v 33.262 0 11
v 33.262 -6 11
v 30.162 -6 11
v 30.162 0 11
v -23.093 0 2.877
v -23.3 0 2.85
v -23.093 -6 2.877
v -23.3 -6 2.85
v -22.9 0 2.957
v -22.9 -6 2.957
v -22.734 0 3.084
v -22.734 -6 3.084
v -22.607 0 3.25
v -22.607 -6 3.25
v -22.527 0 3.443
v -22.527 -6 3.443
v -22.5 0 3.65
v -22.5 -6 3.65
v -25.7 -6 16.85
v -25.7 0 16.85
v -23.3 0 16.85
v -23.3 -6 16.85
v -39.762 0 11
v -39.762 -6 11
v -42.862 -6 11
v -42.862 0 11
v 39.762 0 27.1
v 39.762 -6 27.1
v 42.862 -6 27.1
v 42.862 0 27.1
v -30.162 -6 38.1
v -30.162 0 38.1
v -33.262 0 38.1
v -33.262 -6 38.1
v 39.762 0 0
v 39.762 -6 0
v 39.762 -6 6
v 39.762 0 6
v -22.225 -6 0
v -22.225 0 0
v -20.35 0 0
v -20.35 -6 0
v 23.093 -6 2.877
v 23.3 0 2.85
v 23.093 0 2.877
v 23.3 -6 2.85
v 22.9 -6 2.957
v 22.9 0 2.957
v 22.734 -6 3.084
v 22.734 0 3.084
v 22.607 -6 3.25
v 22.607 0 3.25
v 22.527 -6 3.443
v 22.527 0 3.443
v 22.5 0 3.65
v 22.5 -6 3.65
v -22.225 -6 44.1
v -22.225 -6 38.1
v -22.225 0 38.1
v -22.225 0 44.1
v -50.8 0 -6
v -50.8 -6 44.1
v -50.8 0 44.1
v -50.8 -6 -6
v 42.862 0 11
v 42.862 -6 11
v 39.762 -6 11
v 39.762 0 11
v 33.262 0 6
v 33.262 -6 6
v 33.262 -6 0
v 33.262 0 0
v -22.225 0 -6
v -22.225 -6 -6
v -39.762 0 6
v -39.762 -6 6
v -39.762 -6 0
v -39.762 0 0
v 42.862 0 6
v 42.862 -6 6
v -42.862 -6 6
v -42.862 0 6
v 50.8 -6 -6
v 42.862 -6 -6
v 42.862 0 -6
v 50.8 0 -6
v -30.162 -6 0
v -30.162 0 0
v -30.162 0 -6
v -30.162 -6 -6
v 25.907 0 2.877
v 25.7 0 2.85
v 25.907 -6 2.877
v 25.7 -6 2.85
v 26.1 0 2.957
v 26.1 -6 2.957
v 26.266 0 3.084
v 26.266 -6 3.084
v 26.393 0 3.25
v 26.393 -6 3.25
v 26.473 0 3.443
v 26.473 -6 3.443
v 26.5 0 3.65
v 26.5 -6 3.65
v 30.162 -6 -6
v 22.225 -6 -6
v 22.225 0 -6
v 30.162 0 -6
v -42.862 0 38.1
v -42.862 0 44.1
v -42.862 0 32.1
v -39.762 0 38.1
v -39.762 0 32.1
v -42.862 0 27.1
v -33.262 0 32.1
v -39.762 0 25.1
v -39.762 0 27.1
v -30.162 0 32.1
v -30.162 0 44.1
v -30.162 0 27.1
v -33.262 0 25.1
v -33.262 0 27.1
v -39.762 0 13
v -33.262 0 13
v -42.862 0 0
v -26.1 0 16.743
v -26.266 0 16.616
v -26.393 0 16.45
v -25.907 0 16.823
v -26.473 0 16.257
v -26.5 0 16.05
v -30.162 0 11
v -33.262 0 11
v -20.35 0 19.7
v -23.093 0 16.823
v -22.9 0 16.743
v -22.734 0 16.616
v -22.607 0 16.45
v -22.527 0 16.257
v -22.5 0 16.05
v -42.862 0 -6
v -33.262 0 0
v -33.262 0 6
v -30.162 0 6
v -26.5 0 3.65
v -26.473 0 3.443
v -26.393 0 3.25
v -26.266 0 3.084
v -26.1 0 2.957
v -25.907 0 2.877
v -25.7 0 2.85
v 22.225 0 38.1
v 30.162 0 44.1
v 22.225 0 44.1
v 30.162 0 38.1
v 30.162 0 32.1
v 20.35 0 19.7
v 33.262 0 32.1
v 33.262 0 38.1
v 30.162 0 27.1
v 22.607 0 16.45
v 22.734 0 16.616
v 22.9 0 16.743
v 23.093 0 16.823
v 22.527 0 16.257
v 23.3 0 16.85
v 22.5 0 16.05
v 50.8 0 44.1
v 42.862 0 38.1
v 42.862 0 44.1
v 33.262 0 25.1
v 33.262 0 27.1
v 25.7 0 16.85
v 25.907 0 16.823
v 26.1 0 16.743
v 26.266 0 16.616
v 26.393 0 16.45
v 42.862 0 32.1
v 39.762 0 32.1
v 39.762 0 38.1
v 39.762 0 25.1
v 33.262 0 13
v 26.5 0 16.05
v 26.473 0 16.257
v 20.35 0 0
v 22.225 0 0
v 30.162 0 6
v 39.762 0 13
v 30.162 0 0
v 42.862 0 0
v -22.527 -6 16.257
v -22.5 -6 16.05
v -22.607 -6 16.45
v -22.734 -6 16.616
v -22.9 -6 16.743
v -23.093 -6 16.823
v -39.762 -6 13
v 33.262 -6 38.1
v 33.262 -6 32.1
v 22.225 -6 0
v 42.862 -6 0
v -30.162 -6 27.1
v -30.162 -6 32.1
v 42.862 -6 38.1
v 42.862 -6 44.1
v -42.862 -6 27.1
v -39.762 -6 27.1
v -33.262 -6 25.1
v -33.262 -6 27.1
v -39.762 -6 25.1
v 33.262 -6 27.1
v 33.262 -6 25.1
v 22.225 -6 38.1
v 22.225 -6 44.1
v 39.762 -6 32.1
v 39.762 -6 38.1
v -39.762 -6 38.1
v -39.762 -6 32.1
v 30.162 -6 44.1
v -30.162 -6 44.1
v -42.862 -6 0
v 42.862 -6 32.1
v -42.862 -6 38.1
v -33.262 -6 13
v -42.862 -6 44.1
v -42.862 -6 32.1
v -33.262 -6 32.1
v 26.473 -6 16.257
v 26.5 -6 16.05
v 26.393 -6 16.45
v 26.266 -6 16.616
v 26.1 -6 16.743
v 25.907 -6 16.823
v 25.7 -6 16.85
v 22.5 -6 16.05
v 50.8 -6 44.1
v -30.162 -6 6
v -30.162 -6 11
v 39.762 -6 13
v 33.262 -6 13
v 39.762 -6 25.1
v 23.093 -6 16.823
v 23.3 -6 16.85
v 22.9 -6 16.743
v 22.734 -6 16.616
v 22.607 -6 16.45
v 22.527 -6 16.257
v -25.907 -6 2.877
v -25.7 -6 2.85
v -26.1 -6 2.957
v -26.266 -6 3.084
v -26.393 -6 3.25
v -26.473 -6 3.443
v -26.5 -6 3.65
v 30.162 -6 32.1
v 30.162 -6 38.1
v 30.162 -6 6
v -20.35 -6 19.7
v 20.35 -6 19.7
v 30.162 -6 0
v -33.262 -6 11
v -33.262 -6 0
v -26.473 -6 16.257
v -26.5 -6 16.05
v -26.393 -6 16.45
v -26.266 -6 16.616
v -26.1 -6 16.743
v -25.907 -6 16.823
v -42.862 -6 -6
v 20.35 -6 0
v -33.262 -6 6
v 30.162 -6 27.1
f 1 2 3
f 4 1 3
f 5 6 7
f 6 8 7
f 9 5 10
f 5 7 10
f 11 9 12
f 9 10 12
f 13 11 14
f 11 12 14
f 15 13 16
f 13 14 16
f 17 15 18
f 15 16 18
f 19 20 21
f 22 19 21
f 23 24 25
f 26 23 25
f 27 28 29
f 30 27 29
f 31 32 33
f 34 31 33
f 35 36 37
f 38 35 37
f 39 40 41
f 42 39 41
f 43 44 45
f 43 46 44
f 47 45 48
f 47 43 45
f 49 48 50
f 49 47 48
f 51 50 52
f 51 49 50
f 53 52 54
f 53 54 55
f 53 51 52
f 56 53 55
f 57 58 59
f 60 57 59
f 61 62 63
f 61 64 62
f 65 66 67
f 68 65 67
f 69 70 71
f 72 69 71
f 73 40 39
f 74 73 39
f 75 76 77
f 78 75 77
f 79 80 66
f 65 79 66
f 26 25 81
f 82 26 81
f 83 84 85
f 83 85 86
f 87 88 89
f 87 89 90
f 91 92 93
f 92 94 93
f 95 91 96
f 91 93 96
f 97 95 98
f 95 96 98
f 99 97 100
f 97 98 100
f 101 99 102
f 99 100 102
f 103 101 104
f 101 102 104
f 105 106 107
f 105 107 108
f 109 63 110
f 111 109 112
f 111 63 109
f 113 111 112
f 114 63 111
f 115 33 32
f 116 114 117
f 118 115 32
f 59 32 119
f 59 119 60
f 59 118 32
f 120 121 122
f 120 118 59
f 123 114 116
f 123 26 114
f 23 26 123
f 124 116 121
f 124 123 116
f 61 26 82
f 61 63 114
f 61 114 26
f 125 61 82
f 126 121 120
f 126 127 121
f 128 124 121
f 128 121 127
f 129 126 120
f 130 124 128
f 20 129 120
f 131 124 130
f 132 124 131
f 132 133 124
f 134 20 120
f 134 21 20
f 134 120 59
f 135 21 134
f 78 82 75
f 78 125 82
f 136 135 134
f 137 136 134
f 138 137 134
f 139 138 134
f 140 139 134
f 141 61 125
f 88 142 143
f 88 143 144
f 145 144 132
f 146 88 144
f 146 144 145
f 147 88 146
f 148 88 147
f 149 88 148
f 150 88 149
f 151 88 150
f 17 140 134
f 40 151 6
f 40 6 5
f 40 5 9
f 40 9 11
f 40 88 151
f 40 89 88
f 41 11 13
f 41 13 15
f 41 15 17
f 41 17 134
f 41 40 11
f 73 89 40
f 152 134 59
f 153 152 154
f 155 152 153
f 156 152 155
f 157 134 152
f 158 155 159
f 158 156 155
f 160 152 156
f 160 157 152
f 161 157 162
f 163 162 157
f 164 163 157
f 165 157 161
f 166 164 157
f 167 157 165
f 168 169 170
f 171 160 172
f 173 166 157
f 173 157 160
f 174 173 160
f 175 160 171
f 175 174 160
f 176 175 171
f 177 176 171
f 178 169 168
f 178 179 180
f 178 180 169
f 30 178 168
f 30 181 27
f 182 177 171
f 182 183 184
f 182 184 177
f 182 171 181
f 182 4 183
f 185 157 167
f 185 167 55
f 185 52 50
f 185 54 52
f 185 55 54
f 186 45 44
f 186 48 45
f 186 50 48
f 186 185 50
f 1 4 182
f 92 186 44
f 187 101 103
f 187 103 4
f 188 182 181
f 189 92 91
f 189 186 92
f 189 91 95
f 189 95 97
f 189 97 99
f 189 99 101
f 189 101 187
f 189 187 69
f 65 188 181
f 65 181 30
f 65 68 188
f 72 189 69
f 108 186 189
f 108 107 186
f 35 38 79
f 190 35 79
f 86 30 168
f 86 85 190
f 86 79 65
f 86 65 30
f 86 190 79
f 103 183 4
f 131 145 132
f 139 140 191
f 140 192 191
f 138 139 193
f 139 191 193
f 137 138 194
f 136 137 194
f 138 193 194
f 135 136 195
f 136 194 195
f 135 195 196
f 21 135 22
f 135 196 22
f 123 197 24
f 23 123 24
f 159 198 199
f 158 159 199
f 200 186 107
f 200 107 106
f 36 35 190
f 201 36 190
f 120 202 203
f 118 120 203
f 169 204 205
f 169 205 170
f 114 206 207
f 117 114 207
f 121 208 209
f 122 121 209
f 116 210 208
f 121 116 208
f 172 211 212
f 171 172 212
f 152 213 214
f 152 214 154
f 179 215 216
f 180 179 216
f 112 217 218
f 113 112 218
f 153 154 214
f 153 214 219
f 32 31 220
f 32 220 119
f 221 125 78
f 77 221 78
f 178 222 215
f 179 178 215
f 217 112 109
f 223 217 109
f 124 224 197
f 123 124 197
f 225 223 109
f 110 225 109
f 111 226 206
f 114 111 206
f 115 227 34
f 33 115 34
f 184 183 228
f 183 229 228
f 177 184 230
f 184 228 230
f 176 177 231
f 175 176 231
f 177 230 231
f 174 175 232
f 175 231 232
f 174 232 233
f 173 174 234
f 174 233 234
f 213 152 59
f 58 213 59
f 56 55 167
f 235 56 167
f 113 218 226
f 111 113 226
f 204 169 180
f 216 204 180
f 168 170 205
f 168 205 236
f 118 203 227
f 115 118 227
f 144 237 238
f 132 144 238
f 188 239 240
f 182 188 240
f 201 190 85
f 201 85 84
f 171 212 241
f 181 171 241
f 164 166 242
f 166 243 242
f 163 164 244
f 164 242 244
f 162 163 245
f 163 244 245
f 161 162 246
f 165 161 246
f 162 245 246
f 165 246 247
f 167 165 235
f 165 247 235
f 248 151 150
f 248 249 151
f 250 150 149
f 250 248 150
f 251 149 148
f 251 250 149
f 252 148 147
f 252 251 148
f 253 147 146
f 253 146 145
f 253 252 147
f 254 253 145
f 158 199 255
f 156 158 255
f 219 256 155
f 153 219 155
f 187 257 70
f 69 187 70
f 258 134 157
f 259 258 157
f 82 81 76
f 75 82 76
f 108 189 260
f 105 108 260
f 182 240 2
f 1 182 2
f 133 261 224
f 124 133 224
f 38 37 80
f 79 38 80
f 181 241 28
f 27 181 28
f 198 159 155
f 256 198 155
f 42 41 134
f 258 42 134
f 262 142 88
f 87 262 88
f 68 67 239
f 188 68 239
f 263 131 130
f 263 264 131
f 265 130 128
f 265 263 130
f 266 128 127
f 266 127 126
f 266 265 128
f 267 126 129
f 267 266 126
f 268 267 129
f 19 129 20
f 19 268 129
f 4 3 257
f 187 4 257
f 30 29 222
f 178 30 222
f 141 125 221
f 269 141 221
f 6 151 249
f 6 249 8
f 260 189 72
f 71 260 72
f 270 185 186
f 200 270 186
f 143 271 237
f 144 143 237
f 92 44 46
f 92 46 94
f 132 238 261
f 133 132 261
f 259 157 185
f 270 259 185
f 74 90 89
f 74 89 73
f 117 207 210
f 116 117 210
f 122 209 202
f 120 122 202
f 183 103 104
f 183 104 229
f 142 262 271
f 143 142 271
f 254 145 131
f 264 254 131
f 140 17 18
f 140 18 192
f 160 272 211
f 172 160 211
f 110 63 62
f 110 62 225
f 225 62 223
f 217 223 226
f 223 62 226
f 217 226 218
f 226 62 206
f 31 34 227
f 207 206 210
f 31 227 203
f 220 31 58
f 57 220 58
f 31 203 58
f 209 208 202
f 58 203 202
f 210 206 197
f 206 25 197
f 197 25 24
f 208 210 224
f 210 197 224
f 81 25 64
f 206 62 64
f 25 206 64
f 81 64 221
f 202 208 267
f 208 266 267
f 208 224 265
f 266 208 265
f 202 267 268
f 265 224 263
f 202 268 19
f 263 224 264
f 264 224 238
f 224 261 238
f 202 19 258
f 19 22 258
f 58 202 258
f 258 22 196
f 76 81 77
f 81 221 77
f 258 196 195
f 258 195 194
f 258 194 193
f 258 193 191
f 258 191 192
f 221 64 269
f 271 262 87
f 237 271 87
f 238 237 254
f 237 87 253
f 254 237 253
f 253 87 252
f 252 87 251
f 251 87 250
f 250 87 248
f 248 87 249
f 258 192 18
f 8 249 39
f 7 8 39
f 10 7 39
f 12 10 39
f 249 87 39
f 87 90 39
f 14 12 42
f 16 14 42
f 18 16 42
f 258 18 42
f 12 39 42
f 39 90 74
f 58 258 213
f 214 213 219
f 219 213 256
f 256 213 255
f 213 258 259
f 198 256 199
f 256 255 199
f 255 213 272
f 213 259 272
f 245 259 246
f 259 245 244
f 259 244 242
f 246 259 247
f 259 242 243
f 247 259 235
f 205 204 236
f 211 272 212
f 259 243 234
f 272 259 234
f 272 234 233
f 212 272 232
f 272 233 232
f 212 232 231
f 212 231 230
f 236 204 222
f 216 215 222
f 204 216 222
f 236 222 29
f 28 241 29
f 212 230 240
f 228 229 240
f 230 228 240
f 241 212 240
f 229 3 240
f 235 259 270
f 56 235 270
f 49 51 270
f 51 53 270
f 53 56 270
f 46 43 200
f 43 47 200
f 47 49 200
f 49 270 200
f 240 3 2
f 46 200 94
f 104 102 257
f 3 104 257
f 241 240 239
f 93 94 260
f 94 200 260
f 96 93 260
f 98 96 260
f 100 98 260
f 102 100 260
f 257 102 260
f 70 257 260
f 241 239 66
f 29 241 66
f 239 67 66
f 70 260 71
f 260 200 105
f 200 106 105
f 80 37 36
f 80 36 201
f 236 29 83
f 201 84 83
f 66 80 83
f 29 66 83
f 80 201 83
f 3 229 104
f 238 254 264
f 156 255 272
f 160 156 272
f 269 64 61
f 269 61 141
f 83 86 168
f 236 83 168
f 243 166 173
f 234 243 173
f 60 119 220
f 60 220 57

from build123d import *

# Parameters (mm, degrees)
F0_W     = 4
F0_H     = 14
F1_DEPTH = 6
F2_R     = 0.8
F3_W     = 7.9375
F3_H     = 6
F4_DEPTH = 6
F5_W     = 7.9375
F5_H     = 6
F6_DEPTH = 6
F8_DEPTH = 25.4


with BuildPart() as f1:
    # F0 (on Front) → F1 (new body)
    with BuildSketch(Plane.XZ):
        Polygon((50.8, 38.1), (-50.8, 38.1), (-50.8, 0), (-20.35, 0), (-20.35, 19.7), (20.35, 19.7), (20.35, 0), (50.8, 0), align=None)
        with Locations((-24.5, 9.85)):
            Rectangle(F0_W, F0_H, mode=Mode.SUBTRACT)
        with Locations((24.5, 9.85)):
            Rectangle(F0_W, F0_H, mode=Mode.SUBTRACT)
    extrude(amount=F1_DEPTH)

    # F2
    f2_edges = [f1.edges().sort_by_distance(p)[0] for p in [
        (-26.5, -3, 16.85),
        (-22.5, -3, 2.85),
        (-22.5, -3, 16.85),
        (-26.5, -3, 2.85),
        (22.5, -3, 2.85),
        (22.5, -3, 16.85),
        (26.5, -3, 16.85),
        (26.5, -3, 2.85),
    ]]
    fillet(f2_edges, radius=F2_R)

    # F3 (on face) → F4 (join)
    with BuildSketch(Plane(origin=(0, 0, 0), x_dir=(1, 0, 0), z_dir=(0, 0, -1))):
        with Locations((-46.83125, 3)):
            Rectangle(F3_W, F3_H)
        with Locations((46.83125, 3)):
            Rectangle(F3_W, F3_H)
        with Locations((-26.19375, 3)):
            Rectangle(F3_W, F3_H)
        with Locations((26.19375, 3)):
            Rectangle(F3_W, F3_H)
    extrude(amount=F4_DEPTH)

    # F5 (on face) → F6 (join)
    with BuildSketch(Plane.XY.offset(38.1)):
        with Locations((-46.83125, -3)):
            Rectangle(F5_W, F5_H)
        with Locations((-26.19375, -3)):
            Rectangle(F5_W, F5_H)
        with Locations((26.19375, -3)):
            Rectangle(F5_W, F5_H)
        with Locations((46.83125, -3)):
            Rectangle(F5_W, F5_H)
    extrude(amount=F6_DEPTH)

    # F7 (on face) → F8 (cut)
    with BuildSketch(Plane.XZ.offset(6)):
        Polygon((-33.2625, 38.1), (-36.5125, 38.1), (-39.7625, 38.1), (-39.7625, 32.1), (-42.8625, 32.1), (-42.8625, 27.1), (-39.7625, 27.1), (-39.7625, 25.1), (-36.5125, 25.1), (-33.2625, 25.1), (-33.2625, 27.1), (-30.1625, 27.1), (-30.1625, 32.1), (-33.2625, 32.1), align=None)
        Polygon((39.7625, 32.1), (39.7625, 38.1), (36.5125, 38.1), (33.2625, 38.1), (33.2625, 32.1), (30.1625, 32.1), (30.1625, 27.1), (33.2625, 27.1), (33.2625, 25.1), (36.5125, 25.1), (39.7625, 25.1), (39.7625, 27.1), (42.8625, 27.1), (42.8625, 32.1), align=None)
        Polygon((33.2625, 6), (33.2625, 0), (36.5125, 0), (39.7625, 0), (39.7625, 6), (42.8625, 6), (42.8625, 11), (39.7625, 11), (39.7625, 13), (36.5125, 13), (33.2625, 13), (33.2625, 11), (30.1625, 11), (30.1625, 6), align=None)
        Polygon((-39.7625, 6), (-39.7625, 0), (-36.5125, 0), (-33.2625, 0), (-33.2625, 6), (-30.1625, 6), (-30.1625, 11), (-33.2625, 11), (-33.2625, 13), (-36.5125, 13), (-39.7625, 13), (-39.7625, 11), (-42.8625, 11), (-42.8625, 6), align=None)
    extrude(amount=-F8_DEPTH, mode=Mode.SUBTRACT)


solid = f1.part
